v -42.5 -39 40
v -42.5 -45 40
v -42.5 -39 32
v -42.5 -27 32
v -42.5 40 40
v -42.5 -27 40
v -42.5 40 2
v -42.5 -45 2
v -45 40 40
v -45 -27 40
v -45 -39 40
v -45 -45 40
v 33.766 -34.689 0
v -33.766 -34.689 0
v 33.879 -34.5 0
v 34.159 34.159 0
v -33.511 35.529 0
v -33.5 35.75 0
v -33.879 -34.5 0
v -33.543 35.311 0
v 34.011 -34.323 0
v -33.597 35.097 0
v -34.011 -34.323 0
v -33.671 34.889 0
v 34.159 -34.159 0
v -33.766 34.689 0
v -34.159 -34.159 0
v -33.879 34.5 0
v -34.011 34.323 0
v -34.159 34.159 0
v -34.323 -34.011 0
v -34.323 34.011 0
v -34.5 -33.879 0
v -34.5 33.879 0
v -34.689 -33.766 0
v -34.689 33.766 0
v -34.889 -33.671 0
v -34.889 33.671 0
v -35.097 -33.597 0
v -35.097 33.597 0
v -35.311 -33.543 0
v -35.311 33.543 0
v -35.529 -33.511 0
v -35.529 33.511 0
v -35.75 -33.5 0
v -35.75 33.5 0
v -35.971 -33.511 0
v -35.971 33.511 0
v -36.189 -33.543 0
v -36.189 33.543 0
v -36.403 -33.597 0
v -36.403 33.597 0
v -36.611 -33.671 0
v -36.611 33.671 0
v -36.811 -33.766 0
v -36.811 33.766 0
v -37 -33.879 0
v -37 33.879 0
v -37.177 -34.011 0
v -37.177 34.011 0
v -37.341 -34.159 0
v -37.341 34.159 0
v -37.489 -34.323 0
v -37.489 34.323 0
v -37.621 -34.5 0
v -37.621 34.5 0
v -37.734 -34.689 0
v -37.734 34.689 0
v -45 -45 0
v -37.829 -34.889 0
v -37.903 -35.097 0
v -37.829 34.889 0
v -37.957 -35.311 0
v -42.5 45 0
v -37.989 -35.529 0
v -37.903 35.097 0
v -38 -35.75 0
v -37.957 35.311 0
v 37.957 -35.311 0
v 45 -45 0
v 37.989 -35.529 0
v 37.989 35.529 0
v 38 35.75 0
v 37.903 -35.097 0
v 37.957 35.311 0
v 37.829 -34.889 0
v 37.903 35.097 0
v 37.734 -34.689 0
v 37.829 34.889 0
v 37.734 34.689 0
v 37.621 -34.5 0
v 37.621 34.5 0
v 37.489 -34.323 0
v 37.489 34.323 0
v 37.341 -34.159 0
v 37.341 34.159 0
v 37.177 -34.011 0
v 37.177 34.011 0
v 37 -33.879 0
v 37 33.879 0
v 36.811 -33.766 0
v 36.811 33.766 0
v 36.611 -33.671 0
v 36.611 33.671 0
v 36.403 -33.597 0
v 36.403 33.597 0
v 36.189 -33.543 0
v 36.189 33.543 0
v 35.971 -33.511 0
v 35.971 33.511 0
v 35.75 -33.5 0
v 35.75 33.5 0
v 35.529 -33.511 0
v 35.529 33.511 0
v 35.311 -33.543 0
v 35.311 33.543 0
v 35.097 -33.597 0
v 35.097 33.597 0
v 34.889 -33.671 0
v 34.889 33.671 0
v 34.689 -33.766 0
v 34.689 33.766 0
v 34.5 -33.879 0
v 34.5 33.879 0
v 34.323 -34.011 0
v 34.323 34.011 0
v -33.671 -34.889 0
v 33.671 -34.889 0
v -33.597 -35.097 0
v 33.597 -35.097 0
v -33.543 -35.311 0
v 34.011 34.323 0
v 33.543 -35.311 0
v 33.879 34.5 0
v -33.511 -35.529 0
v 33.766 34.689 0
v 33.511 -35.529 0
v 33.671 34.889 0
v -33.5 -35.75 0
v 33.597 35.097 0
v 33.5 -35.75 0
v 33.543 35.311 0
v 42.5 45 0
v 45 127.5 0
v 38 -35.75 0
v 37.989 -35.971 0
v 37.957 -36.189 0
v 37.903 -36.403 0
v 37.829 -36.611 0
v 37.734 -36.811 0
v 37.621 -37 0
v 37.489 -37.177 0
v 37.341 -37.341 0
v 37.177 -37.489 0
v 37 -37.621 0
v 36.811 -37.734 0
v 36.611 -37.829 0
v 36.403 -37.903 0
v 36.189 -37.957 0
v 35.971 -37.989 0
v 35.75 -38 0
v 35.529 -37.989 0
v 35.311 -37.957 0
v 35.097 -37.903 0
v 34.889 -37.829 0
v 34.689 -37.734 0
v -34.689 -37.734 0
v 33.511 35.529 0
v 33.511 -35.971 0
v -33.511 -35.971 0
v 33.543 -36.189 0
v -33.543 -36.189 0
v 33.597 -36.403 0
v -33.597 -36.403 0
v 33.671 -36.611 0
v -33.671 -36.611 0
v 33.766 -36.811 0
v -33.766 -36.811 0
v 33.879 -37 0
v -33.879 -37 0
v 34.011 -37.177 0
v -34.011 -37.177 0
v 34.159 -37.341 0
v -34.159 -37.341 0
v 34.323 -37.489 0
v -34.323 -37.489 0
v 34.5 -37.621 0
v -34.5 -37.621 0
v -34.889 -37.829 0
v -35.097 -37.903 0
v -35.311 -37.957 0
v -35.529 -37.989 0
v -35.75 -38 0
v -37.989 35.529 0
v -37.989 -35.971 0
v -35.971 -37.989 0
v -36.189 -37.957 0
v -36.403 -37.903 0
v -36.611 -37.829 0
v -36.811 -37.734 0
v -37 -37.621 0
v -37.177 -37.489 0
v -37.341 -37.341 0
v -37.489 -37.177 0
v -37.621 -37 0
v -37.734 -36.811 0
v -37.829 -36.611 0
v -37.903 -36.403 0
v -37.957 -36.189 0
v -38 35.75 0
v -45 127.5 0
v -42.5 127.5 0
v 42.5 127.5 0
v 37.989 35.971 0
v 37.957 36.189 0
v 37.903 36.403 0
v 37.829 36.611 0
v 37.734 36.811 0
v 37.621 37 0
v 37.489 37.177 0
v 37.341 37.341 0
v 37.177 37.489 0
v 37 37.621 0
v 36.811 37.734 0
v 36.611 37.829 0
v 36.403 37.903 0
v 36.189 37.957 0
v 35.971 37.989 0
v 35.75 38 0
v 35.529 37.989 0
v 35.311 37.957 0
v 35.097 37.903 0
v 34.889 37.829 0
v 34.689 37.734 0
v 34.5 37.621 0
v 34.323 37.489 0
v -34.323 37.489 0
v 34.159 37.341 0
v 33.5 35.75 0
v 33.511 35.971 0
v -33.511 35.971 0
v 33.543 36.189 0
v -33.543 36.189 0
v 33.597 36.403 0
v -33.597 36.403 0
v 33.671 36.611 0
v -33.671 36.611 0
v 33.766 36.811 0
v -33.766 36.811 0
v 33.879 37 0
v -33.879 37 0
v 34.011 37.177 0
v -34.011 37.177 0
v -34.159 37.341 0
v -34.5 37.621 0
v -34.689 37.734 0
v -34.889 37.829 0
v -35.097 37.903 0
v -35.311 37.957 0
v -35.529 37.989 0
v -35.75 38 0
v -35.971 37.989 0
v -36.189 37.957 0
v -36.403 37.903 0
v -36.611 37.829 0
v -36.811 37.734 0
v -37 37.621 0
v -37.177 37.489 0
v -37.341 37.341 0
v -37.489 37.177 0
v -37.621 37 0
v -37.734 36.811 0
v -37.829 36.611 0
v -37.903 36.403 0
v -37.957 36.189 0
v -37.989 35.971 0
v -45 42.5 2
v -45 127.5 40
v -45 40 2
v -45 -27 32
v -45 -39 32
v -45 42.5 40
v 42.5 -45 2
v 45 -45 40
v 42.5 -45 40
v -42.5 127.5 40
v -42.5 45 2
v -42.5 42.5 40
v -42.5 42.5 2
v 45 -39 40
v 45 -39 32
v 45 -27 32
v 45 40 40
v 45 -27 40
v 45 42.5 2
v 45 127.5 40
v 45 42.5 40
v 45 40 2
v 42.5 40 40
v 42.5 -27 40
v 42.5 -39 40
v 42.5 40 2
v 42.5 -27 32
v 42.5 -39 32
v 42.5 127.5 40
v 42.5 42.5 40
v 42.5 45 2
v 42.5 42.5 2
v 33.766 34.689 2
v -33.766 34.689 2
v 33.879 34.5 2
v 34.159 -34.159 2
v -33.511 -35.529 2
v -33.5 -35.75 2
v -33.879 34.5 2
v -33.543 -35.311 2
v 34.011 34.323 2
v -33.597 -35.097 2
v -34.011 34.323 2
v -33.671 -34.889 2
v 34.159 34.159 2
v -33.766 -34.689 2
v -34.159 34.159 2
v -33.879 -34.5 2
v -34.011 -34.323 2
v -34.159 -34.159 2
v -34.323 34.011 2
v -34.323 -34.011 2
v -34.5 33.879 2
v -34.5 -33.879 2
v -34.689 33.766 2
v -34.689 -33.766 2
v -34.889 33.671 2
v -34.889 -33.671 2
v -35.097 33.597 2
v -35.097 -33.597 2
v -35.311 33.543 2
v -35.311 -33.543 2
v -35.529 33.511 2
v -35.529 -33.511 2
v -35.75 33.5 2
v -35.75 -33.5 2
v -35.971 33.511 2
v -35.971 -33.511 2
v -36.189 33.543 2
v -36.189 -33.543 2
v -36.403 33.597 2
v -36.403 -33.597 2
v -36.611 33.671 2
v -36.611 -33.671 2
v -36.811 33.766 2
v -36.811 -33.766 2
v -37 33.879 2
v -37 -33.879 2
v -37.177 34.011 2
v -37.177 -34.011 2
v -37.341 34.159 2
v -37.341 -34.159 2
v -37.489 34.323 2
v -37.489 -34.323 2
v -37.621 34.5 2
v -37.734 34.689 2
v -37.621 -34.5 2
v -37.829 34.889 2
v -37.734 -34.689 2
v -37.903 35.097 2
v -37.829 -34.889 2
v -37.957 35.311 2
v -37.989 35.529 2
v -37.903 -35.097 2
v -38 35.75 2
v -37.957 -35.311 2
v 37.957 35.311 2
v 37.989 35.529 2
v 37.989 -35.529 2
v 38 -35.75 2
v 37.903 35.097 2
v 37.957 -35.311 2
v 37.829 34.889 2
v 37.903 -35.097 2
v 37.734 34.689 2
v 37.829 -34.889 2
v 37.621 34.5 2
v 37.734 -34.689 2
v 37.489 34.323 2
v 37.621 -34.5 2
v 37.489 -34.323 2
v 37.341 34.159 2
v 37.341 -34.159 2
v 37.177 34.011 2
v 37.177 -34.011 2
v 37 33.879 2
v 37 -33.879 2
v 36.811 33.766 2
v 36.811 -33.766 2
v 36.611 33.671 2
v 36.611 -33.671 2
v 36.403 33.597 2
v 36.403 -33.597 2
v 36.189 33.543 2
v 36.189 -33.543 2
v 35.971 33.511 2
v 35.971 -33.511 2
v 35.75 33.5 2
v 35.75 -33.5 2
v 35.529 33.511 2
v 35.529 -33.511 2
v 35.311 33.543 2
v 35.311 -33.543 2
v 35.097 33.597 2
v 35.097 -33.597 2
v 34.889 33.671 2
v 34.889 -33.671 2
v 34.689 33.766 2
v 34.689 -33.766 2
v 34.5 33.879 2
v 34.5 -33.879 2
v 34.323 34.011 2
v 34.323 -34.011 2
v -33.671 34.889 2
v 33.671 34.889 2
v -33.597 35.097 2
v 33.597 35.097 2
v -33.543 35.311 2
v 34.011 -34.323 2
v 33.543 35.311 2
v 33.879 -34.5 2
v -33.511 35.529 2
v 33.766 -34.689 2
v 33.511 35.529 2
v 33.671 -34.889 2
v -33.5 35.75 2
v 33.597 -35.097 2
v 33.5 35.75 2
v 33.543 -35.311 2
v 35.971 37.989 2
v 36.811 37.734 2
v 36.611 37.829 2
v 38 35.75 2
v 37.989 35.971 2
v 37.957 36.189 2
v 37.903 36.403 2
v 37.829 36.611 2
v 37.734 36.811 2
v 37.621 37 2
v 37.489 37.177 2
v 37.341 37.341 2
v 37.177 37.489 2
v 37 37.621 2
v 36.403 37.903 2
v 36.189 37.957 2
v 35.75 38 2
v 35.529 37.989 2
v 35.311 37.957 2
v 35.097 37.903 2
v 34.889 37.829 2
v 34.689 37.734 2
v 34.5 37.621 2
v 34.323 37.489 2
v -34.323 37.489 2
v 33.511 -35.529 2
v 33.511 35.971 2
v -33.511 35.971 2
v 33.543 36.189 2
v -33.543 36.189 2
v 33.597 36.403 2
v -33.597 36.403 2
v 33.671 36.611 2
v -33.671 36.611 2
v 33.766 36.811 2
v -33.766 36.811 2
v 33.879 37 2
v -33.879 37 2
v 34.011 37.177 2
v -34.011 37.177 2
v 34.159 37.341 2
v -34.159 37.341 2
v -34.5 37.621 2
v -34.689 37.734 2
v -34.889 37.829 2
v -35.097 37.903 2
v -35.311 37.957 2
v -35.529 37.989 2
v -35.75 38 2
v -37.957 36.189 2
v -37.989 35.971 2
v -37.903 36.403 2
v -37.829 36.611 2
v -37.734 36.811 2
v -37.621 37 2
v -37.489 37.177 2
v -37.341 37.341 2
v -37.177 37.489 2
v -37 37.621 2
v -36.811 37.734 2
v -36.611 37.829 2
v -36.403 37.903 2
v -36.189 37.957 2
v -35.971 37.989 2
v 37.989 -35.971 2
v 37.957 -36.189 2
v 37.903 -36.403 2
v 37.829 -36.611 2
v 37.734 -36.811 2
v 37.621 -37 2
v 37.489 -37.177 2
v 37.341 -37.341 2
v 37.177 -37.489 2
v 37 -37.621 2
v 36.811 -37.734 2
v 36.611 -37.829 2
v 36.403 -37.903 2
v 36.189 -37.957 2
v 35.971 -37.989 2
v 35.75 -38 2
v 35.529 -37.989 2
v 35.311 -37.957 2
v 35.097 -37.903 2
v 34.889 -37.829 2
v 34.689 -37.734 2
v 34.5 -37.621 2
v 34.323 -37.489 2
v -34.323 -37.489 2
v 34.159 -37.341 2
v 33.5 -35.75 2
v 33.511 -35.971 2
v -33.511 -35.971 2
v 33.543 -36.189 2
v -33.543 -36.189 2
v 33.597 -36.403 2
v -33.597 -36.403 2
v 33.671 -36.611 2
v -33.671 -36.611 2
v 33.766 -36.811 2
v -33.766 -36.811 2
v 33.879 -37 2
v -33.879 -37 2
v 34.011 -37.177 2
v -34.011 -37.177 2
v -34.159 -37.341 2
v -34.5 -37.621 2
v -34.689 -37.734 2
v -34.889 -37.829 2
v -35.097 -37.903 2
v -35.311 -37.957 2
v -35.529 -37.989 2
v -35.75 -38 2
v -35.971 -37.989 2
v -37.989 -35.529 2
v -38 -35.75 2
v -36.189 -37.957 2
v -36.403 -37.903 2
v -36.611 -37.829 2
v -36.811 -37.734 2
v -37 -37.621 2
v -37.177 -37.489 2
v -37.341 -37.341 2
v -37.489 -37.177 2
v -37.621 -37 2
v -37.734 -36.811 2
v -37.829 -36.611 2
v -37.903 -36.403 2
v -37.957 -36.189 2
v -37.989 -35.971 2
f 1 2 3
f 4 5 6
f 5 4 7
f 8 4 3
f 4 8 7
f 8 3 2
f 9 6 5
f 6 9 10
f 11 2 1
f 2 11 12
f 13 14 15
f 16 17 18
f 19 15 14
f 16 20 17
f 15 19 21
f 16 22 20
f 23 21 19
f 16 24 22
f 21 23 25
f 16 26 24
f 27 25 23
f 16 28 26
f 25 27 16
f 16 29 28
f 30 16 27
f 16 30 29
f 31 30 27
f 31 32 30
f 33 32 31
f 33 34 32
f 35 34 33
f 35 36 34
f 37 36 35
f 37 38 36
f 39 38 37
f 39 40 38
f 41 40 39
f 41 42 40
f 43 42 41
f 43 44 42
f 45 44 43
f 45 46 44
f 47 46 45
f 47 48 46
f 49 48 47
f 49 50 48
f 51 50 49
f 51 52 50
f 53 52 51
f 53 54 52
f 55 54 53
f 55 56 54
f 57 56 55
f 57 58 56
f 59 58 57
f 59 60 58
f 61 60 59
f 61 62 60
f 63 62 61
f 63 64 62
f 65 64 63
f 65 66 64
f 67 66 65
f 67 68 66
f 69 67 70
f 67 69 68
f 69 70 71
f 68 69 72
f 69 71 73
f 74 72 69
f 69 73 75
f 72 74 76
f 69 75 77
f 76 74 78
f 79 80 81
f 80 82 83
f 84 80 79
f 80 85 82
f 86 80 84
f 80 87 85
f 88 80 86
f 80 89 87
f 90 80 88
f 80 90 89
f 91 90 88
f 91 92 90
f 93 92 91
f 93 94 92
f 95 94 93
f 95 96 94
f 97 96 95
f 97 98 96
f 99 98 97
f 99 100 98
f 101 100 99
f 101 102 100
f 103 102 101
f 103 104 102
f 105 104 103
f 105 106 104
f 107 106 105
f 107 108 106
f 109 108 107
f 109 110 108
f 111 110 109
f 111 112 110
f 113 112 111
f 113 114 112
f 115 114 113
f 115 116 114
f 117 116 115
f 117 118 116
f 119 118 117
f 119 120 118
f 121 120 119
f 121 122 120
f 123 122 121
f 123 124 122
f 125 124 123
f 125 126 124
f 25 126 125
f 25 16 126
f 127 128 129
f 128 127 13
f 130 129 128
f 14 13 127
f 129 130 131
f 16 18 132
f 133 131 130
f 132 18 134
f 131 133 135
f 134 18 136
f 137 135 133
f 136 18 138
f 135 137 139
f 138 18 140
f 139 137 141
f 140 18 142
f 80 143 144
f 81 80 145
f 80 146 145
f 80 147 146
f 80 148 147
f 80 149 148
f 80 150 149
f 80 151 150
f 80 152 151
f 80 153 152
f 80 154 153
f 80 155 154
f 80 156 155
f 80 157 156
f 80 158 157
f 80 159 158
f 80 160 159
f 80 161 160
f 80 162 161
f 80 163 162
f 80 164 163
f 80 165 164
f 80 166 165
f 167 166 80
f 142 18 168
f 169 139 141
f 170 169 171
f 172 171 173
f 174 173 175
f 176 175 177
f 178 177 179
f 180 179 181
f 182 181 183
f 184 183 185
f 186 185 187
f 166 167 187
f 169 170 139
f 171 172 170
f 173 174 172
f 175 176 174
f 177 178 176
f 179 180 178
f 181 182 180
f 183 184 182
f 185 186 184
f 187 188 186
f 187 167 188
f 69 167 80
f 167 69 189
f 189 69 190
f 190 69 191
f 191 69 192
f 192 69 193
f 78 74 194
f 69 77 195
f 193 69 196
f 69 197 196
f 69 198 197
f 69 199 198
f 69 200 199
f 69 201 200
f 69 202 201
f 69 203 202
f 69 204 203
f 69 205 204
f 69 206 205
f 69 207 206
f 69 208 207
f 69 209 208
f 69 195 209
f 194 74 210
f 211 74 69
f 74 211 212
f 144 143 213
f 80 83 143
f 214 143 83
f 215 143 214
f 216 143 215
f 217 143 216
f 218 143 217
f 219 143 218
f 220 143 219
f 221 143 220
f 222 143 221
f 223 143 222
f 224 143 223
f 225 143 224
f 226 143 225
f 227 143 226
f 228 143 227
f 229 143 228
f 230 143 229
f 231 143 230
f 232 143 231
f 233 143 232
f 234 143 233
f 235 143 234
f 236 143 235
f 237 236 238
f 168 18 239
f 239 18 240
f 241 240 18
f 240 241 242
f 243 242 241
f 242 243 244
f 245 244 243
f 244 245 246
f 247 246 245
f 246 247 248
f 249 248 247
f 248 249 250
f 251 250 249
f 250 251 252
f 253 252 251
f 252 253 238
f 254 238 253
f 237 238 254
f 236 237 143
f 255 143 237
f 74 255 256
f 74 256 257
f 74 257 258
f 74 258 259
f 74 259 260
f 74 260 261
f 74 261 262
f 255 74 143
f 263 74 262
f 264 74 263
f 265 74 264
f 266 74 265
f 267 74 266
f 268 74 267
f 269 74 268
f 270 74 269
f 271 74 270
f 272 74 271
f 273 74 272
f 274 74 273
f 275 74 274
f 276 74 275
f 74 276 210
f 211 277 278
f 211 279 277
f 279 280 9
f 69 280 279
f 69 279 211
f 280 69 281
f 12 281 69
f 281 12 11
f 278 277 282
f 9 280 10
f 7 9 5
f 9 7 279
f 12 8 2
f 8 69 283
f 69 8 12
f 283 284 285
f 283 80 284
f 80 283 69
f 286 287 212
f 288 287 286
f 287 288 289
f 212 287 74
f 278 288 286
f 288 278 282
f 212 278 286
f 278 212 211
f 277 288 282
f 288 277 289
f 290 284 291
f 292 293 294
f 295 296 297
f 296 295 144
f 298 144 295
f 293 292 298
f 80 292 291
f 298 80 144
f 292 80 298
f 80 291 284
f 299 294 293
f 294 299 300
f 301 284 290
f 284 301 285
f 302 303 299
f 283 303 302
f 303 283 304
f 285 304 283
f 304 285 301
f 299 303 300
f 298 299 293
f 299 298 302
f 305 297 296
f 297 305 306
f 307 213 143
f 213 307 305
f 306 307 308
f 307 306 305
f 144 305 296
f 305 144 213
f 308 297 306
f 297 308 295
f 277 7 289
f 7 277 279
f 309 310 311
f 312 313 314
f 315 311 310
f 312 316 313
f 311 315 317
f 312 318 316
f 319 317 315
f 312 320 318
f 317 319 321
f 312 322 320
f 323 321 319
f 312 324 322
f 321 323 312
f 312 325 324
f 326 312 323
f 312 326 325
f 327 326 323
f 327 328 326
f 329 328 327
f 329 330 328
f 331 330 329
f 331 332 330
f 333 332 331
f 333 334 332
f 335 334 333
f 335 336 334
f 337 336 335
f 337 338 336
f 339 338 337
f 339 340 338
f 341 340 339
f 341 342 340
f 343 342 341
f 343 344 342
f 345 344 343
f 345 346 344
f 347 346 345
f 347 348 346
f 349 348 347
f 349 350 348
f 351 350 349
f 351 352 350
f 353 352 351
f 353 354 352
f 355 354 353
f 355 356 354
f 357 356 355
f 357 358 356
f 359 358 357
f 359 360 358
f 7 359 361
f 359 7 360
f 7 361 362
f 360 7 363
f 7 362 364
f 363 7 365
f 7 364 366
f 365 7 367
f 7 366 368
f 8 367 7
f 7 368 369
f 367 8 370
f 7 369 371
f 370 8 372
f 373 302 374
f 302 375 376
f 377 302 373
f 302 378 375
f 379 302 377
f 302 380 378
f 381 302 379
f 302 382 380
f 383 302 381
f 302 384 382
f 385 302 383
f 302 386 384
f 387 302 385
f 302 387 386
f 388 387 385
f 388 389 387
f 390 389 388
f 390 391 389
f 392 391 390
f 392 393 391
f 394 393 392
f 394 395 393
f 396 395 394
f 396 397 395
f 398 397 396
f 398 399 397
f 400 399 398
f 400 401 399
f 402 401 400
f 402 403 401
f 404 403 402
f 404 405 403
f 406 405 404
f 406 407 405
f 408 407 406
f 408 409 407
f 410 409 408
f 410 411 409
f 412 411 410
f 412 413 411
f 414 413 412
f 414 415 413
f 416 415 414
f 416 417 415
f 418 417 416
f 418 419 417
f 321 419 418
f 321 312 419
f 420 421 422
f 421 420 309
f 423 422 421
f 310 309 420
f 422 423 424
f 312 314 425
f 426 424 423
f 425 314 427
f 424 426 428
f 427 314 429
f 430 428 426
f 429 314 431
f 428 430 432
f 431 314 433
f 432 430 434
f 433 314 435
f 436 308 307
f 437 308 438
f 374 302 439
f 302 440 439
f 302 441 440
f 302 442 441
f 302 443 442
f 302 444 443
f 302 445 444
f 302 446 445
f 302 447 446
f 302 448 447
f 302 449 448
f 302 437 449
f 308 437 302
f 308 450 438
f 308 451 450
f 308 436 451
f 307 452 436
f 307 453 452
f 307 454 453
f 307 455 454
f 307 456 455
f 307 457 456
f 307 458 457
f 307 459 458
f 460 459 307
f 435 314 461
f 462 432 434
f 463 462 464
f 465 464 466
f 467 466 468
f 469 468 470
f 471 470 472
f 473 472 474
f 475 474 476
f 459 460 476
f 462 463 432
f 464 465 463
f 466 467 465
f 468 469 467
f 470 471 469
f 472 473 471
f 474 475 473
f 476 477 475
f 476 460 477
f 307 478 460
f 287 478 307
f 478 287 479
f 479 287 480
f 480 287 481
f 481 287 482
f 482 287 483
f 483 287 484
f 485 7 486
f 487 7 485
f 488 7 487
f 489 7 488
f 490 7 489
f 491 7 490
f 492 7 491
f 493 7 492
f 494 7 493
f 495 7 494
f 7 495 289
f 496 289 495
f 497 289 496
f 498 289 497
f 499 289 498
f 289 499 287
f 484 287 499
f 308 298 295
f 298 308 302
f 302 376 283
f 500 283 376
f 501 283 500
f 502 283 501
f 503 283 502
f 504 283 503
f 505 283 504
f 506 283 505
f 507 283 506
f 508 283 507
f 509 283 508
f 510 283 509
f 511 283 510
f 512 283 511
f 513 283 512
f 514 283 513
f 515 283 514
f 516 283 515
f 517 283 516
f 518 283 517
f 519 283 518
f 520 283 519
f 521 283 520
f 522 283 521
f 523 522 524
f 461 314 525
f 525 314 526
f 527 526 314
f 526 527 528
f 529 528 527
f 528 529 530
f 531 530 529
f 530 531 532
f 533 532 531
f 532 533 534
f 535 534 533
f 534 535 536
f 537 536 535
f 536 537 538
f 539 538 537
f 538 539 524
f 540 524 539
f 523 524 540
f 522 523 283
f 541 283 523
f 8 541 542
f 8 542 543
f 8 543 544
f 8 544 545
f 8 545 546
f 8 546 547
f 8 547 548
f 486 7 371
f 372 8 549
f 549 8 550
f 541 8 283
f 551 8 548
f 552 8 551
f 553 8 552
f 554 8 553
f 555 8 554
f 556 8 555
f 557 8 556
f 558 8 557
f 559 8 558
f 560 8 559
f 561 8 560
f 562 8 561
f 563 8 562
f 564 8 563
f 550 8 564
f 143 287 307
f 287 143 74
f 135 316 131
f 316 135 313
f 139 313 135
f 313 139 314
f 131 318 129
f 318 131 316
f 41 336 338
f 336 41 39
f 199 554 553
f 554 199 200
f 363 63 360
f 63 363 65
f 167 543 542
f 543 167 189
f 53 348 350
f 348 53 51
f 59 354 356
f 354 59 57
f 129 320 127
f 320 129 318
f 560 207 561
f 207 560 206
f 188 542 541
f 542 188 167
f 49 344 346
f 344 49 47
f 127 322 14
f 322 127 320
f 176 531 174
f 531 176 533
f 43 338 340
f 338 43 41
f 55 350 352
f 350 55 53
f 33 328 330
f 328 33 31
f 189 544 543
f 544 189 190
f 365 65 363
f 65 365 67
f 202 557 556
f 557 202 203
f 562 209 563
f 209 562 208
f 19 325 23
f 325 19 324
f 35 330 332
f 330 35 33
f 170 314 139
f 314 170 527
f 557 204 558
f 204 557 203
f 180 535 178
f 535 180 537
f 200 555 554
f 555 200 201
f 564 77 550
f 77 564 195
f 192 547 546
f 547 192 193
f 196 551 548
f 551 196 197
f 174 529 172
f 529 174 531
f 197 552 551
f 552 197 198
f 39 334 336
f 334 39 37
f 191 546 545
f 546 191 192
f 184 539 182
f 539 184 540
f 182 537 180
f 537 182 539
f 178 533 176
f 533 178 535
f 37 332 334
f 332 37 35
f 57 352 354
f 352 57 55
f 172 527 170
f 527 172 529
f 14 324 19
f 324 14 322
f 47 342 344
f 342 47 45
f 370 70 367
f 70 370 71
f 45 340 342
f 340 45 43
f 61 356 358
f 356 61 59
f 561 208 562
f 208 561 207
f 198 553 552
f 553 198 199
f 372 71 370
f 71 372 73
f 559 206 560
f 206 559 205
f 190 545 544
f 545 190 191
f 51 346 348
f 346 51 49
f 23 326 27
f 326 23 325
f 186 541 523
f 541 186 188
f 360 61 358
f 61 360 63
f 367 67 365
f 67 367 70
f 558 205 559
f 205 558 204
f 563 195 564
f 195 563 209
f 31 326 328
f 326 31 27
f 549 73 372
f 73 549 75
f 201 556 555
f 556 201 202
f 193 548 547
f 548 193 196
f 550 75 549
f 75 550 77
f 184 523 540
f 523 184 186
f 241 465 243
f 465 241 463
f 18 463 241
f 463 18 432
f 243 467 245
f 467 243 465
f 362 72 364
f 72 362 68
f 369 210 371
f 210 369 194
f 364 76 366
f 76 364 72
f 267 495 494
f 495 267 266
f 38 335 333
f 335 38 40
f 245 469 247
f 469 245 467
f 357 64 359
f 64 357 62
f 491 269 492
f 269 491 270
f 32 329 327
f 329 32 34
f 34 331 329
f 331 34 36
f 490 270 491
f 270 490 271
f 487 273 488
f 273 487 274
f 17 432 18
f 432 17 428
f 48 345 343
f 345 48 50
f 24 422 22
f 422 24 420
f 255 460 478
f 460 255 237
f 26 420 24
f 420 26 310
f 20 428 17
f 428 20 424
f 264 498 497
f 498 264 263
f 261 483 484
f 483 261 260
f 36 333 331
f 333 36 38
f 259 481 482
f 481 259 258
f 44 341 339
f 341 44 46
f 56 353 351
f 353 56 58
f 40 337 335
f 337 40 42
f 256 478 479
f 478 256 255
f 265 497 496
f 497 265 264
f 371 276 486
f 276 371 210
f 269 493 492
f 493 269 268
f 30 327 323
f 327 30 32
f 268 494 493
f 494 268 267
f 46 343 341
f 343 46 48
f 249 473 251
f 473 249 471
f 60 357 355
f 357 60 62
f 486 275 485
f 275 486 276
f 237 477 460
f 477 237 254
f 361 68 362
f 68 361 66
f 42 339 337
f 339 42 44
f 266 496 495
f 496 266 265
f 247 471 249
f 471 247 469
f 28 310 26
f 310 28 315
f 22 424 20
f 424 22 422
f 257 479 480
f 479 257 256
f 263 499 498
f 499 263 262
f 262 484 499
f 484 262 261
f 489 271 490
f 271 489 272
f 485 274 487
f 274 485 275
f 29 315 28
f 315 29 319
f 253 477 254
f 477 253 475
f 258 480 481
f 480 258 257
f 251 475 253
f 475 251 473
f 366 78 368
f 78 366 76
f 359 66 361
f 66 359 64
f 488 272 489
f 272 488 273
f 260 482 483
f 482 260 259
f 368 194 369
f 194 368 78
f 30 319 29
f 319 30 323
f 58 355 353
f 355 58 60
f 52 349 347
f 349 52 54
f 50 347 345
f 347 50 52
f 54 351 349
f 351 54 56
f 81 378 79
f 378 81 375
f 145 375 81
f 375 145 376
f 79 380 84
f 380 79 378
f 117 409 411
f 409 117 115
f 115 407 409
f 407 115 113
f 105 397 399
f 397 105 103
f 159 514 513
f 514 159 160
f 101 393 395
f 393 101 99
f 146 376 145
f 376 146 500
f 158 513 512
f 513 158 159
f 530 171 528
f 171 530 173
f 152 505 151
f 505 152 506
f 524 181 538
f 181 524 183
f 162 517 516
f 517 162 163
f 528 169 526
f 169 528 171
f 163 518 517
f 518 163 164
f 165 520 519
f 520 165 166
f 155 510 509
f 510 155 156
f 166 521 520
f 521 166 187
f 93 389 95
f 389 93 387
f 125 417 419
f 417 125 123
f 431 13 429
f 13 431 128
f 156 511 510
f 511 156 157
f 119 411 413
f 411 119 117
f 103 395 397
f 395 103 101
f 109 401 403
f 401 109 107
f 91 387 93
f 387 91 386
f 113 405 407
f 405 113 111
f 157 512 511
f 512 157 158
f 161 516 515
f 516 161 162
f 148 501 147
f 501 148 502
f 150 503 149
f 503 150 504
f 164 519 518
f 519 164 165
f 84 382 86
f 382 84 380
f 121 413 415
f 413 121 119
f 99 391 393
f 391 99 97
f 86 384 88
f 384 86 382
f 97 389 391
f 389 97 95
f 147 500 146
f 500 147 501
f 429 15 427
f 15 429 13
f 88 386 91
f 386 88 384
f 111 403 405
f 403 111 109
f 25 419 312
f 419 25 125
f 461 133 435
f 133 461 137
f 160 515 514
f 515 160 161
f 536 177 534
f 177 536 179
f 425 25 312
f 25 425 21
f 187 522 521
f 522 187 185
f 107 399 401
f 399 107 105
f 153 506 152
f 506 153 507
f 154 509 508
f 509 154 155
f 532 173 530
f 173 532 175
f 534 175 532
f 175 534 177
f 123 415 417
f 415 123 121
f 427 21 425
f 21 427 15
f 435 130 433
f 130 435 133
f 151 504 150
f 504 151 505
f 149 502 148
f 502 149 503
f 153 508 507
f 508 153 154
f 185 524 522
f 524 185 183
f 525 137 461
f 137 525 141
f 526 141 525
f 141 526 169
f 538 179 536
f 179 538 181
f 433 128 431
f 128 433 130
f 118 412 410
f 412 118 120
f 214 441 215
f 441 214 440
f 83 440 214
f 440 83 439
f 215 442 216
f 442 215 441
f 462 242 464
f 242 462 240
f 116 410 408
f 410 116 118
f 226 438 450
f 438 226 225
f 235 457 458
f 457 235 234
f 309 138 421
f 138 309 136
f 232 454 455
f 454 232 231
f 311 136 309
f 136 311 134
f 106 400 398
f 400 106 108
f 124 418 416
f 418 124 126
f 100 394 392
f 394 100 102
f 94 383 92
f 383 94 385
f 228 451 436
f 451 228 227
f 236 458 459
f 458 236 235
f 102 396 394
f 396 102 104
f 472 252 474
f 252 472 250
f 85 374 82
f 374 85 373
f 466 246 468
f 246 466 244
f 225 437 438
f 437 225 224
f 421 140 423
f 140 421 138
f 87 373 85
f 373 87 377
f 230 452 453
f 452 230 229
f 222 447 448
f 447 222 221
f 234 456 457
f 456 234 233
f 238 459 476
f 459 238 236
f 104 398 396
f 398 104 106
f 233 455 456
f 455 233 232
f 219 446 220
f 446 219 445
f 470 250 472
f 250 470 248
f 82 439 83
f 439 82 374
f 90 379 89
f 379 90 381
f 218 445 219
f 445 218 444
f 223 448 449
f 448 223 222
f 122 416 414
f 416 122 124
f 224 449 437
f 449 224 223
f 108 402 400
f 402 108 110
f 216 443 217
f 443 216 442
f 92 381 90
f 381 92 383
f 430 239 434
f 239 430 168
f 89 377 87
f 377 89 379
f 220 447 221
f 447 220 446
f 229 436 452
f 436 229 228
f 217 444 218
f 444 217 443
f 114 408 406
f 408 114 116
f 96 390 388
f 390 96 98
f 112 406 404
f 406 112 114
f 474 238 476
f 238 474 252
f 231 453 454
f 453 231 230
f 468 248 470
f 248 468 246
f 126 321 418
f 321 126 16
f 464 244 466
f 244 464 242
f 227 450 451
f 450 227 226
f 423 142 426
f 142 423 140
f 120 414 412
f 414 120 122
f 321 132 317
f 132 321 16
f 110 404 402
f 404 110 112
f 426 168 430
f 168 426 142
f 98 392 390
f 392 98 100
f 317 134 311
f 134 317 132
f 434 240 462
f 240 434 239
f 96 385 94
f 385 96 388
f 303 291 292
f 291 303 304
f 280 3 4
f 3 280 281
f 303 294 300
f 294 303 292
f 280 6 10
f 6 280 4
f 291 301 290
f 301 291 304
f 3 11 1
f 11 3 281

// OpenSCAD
// Magnetic stirrer housing for 80 mm PC case fan
// Print orientation: top plate on bed (z = 0), walls build upward (+Z)

// ---------- Dimensions ----------
plate_t      = 2;     // top plate thickness
wall_t       = 2.5;   // wall thickness
box_h        = 40;    // outer wall height (open top)
outer_x      = 90;    // outer size in X
outer_y      = 90;    // outer size in Y
hole_d       = 4.5;   // M4 screw hole diameter
hole_pitch   = 71.5;  // square pattern centre-to-centre
notch_w      = 12;    // cable notch width
notch_depth  = 8;     // notch depth from open edge (z = 32 to 40)
eps          = 0.5;   // cutter overshoot

$fn = 64;

// ---------- Model ----------
difference() {
    union() {
        // Top plate
        translate([-outer_x/2, -outer_y/2, 0])
            cube([outer_x, outer_y, plate_t]);

        // Four walls from top plate up to open top
        for (sx = [-1, 1], sy = [-1, 1])
            translate([sx > 0 ? outer_x/2 - wall_t : -outer_x/2,
                       sy > 0 ? outer_y/2 - wall_t : -outer_y/2,
                       0])
                cube([wall_t, outer_y - 2*wall_t, box_h]);
    }

    // Screw holes through top plate
    for (x = [-hole_pitch/2, hole_pitch/2], y = [-hole_pitch/2, hole_pitch/2])
        translate([x, y, -eps])
            cylinder(d = hole_d, h = plate_t + 2*eps);

    // Cable notch in one wall (z = 32 to 40)
    translate([-outer_x/2, -outer_y/2 + notch_w/2, box_h - notch_depth])
        cube([outer_x, notch_w, notch_depth + eps]);
}
